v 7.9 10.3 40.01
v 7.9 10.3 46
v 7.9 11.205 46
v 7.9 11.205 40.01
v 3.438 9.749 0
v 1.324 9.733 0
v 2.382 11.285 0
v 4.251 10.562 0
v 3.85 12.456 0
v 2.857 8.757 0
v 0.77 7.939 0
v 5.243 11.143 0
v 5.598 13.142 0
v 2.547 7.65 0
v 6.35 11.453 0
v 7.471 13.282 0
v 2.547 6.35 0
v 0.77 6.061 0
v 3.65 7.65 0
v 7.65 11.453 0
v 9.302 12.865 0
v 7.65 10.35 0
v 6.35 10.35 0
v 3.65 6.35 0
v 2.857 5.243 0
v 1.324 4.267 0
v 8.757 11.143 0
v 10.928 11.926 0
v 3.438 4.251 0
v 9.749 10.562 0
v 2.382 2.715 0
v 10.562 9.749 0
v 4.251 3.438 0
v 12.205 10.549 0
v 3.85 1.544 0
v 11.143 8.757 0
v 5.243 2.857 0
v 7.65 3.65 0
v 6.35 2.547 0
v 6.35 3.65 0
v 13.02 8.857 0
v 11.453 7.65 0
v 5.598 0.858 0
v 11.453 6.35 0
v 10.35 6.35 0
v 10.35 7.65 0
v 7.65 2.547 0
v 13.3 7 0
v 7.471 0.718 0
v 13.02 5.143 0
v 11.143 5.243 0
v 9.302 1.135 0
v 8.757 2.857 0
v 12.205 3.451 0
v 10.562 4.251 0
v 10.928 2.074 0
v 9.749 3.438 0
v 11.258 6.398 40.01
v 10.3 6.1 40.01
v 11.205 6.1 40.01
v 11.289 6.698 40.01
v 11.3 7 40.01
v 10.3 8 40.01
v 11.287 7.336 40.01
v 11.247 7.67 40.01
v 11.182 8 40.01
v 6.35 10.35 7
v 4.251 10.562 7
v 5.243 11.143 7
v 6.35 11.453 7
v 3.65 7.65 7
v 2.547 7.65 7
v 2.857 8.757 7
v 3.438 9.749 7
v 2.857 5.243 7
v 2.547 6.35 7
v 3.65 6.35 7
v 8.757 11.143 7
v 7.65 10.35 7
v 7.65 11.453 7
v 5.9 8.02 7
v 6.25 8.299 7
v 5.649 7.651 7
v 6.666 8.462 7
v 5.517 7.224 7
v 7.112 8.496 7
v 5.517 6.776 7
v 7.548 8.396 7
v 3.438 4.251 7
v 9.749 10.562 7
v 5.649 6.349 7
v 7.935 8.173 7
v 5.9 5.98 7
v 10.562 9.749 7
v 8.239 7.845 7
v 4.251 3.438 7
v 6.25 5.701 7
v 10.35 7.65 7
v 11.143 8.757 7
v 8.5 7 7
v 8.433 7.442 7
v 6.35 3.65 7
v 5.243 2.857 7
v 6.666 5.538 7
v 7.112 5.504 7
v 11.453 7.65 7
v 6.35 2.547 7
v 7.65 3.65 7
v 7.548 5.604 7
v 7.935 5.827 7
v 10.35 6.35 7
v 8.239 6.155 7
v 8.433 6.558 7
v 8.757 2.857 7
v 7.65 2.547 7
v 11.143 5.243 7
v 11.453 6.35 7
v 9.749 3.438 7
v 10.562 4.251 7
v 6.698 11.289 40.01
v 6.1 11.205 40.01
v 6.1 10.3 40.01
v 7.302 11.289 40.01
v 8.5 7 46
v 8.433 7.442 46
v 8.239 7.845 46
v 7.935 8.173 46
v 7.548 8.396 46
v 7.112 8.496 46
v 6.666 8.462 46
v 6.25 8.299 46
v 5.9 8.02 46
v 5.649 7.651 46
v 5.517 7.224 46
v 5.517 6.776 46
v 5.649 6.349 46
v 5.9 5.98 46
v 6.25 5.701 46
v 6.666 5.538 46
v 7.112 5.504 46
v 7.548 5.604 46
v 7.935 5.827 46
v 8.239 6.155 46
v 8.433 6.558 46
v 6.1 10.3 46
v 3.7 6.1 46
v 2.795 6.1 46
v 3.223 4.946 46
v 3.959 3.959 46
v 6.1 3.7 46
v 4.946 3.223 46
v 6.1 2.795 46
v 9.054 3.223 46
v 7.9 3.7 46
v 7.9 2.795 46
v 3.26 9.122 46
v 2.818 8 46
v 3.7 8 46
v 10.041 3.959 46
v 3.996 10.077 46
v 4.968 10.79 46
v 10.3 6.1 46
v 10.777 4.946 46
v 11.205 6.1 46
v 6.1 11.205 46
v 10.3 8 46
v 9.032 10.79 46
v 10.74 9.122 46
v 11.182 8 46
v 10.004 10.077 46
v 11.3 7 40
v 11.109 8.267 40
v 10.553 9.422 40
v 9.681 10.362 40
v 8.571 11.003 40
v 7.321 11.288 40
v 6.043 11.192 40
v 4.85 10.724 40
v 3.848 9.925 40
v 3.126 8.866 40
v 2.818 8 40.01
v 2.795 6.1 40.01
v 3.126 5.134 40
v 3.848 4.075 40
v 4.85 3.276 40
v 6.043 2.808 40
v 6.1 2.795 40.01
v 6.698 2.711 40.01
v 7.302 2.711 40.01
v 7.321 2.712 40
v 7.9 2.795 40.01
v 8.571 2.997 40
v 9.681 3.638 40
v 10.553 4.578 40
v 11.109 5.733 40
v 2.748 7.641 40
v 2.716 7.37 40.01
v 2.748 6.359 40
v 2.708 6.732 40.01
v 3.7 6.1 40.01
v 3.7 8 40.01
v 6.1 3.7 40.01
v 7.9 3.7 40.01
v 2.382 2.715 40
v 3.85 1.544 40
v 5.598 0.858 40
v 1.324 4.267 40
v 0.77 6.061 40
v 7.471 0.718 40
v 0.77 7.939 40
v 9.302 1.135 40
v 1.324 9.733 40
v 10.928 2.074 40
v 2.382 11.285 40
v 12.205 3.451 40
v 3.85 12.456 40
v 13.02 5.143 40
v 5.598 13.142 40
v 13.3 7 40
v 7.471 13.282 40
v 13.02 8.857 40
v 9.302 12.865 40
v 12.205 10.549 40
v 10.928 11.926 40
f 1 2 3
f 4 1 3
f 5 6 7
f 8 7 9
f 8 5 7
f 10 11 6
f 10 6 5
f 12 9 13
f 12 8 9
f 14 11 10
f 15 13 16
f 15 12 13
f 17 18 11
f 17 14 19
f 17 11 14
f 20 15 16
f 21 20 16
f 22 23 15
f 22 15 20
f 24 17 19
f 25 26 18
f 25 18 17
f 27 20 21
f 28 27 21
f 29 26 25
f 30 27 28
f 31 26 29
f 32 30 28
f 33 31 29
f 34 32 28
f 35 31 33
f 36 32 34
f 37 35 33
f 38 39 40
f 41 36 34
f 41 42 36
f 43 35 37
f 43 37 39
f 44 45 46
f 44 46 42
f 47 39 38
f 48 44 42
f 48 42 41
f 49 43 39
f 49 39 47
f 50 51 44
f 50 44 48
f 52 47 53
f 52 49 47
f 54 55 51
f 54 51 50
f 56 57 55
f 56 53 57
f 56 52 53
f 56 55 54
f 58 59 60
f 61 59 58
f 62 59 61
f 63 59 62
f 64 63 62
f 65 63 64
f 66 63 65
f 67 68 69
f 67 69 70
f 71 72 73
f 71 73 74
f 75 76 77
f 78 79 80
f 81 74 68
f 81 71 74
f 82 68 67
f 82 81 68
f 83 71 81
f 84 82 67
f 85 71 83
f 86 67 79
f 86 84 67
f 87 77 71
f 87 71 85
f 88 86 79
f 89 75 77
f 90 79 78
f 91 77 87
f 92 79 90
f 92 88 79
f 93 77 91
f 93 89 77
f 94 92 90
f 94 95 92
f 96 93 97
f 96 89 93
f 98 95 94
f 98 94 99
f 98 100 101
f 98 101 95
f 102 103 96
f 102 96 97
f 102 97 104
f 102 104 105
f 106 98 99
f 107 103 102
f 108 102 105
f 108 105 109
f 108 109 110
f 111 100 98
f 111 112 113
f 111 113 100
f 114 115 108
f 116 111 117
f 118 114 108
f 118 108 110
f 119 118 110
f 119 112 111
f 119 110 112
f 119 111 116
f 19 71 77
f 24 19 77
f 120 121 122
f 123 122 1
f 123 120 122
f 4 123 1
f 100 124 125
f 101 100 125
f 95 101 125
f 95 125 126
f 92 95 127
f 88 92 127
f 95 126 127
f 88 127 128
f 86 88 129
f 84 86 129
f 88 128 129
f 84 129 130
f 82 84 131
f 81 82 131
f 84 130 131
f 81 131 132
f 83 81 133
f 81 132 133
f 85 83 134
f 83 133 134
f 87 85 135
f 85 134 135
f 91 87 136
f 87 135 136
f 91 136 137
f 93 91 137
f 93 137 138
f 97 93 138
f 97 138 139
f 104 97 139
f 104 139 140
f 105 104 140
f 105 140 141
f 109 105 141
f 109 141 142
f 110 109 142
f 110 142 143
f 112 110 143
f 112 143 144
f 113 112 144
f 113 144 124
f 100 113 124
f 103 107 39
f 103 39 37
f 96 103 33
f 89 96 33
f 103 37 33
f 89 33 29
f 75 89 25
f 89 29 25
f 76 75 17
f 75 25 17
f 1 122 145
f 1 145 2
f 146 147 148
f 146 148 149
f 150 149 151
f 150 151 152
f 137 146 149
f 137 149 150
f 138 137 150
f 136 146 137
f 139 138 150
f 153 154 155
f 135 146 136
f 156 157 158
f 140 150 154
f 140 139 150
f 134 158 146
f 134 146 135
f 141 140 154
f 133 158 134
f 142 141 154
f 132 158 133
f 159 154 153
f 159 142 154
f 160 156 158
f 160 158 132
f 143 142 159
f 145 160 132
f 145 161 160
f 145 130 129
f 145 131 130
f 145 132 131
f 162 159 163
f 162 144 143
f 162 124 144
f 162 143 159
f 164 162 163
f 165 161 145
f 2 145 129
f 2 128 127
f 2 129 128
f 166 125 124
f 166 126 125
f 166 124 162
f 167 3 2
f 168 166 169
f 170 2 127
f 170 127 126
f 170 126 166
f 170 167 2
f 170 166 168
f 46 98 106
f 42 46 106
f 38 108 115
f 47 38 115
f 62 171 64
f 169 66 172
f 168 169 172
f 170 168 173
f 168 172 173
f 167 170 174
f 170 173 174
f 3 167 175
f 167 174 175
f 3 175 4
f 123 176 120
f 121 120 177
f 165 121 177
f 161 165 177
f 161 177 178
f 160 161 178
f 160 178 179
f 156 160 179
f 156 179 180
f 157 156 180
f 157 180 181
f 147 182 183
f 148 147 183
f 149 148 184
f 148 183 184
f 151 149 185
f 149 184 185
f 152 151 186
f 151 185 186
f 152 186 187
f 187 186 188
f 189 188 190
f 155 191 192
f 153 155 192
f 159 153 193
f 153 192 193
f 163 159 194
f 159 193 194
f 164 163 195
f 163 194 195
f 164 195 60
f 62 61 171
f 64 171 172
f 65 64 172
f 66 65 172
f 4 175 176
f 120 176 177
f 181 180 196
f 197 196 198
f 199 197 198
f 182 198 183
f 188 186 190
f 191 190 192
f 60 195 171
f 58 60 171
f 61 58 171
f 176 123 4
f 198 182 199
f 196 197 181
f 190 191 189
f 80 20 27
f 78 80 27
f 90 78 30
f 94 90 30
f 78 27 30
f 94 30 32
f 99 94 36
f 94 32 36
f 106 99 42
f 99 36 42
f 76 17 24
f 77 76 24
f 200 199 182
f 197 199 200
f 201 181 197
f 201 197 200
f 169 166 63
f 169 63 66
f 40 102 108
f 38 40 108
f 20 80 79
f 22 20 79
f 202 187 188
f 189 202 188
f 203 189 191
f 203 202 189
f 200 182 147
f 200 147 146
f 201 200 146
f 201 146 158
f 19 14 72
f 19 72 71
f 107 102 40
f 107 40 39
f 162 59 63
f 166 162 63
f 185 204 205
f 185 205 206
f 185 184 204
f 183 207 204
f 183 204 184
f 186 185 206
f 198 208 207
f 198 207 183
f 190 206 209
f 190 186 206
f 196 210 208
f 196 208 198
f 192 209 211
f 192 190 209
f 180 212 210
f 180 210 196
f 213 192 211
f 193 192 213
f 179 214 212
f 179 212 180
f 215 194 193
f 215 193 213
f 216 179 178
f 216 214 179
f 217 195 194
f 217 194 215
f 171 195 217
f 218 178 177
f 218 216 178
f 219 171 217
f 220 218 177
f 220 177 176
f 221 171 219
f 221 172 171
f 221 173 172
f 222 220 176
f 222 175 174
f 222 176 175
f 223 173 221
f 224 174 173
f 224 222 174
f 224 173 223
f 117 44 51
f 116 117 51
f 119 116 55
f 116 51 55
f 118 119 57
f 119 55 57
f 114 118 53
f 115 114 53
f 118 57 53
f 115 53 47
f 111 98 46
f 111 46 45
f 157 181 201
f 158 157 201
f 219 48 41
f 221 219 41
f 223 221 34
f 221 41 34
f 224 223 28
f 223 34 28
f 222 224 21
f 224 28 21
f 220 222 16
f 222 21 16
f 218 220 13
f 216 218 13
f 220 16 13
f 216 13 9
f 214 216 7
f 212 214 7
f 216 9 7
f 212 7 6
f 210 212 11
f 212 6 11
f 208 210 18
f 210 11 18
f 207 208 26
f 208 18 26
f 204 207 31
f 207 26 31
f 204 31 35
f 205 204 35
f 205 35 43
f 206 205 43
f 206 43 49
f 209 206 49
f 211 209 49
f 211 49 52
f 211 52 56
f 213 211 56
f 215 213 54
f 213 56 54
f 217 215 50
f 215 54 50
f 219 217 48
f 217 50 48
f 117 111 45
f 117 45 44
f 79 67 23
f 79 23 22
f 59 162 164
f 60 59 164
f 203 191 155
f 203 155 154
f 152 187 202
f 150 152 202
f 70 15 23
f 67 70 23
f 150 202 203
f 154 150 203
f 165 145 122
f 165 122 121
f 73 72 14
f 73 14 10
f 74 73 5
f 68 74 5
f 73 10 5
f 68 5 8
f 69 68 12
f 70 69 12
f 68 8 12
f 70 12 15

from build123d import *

# Parameters (mm, degrees)
SKETCH_R        = 6.3
PAD_DEPTH       = 40
SKETCH001_R     = 4.3
PAD001_DEPTH    = 6
SKETCH002_W     = 1.8
SKETCH002_H     = 1.7
SKETCH002_W_2   = 1.4
SKETCH002_H_2   = 1.9
SKETCH002_W_3   = 1.7
POCKET_DEPTH    = 5.99
SKETCH003_R     = 4.5
POCKET001_DEPTH = 7
SKETCH004_W     = 1.3
SKETCH004_H     = 1.5
SKETCH004_W_2   = 1.5
SKETCH004_H_2   = 1.3
PAD002_DEPTH    = 7
SKETCH005_R     = 1.5
POCKET002_DEPTH = 50


with BuildPart() as part:
    # Sketch → Pad (new body)
    with BuildSketch(Plane.XY):
        with Locations((7, 7)):
            Circle(SKETCH_R)
    extrude(amount=PAD_DEPTH)

    # Sketch001 (on Face3 of Pad) → Pad001 (join)
    with BuildSketch(Plane.XY.offset(40)):
        with Locations((7, 7)):
            Circle(SKETCH001_R)
    extrude(amount=PAD001_DEPTH)

    # Sketch002 (on Face5 of Pad001) → Pocket (cut)
    with BuildSketch(Plane.XY.offset(46)):
        with Locations((7, 11.15)):
            Rectangle(SKETCH002_W, SKETCH002_H)
        with Locations((7, 2.85)):
            Rectangle(SKETCH002_W, SKETCH002_H)
        with Locations((3, 7.05)):
            Rectangle(SKETCH002_W_2, SKETCH002_H_2)
        with Locations((11.15, 7.05)):
            Rectangle(SKETCH002_W_3, SKETCH002_H_2)
    extrude(amount=-POCKET_DEPTH, mode=Mode.SUBTRACT)

    # Sketch003 (on Face2 of Pocket) → Pocket001 (cut)
    with BuildSketch(Plane(origin=(0, 0, 0), x_dir=(1, 0, 0), z_dir=(0, 0, -1))):
        with Locations((7, -7)):
            Circle(SKETCH003_R)
    extrude(amount=-POCKET001_DEPTH, mode=Mode.SUBTRACT)

    # Sketch004 (on Face6 of Pocket001) → Pad002 (join)
    with BuildSketch(Plane(origin=(0, 0, 7), x_dir=(1, 0, 0), z_dir=(0, 0, -1))):
        with Locations((7, -2.9)):
            Rectangle(SKETCH004_W, SKETCH004_H)
        with Locations((7, -11.1)):
            Rectangle(SKETCH004_W, SKETCH004_H)
        with Locations((11.1, -7)):
            Rectangle(SKETCH004_W_2, SKETCH004_H_2)
        with Locations((2.9, -7)):
            Rectangle(SKETCH004_W_2, SKETCH004_H_2)
    extrude(amount=PAD002_DEPTH)

    # Sketch005 (on Face28 of Pad002) → Pocket002 (cut)
    with BuildSketch(Plane.XY.offset(46)):
        with Locations((7, 7)):
            Circle(SKETCH005_R)
    extrude(amount=-POCKET002_DEPTH, mode=Mode.SUBTRACT)


solid = part.part
